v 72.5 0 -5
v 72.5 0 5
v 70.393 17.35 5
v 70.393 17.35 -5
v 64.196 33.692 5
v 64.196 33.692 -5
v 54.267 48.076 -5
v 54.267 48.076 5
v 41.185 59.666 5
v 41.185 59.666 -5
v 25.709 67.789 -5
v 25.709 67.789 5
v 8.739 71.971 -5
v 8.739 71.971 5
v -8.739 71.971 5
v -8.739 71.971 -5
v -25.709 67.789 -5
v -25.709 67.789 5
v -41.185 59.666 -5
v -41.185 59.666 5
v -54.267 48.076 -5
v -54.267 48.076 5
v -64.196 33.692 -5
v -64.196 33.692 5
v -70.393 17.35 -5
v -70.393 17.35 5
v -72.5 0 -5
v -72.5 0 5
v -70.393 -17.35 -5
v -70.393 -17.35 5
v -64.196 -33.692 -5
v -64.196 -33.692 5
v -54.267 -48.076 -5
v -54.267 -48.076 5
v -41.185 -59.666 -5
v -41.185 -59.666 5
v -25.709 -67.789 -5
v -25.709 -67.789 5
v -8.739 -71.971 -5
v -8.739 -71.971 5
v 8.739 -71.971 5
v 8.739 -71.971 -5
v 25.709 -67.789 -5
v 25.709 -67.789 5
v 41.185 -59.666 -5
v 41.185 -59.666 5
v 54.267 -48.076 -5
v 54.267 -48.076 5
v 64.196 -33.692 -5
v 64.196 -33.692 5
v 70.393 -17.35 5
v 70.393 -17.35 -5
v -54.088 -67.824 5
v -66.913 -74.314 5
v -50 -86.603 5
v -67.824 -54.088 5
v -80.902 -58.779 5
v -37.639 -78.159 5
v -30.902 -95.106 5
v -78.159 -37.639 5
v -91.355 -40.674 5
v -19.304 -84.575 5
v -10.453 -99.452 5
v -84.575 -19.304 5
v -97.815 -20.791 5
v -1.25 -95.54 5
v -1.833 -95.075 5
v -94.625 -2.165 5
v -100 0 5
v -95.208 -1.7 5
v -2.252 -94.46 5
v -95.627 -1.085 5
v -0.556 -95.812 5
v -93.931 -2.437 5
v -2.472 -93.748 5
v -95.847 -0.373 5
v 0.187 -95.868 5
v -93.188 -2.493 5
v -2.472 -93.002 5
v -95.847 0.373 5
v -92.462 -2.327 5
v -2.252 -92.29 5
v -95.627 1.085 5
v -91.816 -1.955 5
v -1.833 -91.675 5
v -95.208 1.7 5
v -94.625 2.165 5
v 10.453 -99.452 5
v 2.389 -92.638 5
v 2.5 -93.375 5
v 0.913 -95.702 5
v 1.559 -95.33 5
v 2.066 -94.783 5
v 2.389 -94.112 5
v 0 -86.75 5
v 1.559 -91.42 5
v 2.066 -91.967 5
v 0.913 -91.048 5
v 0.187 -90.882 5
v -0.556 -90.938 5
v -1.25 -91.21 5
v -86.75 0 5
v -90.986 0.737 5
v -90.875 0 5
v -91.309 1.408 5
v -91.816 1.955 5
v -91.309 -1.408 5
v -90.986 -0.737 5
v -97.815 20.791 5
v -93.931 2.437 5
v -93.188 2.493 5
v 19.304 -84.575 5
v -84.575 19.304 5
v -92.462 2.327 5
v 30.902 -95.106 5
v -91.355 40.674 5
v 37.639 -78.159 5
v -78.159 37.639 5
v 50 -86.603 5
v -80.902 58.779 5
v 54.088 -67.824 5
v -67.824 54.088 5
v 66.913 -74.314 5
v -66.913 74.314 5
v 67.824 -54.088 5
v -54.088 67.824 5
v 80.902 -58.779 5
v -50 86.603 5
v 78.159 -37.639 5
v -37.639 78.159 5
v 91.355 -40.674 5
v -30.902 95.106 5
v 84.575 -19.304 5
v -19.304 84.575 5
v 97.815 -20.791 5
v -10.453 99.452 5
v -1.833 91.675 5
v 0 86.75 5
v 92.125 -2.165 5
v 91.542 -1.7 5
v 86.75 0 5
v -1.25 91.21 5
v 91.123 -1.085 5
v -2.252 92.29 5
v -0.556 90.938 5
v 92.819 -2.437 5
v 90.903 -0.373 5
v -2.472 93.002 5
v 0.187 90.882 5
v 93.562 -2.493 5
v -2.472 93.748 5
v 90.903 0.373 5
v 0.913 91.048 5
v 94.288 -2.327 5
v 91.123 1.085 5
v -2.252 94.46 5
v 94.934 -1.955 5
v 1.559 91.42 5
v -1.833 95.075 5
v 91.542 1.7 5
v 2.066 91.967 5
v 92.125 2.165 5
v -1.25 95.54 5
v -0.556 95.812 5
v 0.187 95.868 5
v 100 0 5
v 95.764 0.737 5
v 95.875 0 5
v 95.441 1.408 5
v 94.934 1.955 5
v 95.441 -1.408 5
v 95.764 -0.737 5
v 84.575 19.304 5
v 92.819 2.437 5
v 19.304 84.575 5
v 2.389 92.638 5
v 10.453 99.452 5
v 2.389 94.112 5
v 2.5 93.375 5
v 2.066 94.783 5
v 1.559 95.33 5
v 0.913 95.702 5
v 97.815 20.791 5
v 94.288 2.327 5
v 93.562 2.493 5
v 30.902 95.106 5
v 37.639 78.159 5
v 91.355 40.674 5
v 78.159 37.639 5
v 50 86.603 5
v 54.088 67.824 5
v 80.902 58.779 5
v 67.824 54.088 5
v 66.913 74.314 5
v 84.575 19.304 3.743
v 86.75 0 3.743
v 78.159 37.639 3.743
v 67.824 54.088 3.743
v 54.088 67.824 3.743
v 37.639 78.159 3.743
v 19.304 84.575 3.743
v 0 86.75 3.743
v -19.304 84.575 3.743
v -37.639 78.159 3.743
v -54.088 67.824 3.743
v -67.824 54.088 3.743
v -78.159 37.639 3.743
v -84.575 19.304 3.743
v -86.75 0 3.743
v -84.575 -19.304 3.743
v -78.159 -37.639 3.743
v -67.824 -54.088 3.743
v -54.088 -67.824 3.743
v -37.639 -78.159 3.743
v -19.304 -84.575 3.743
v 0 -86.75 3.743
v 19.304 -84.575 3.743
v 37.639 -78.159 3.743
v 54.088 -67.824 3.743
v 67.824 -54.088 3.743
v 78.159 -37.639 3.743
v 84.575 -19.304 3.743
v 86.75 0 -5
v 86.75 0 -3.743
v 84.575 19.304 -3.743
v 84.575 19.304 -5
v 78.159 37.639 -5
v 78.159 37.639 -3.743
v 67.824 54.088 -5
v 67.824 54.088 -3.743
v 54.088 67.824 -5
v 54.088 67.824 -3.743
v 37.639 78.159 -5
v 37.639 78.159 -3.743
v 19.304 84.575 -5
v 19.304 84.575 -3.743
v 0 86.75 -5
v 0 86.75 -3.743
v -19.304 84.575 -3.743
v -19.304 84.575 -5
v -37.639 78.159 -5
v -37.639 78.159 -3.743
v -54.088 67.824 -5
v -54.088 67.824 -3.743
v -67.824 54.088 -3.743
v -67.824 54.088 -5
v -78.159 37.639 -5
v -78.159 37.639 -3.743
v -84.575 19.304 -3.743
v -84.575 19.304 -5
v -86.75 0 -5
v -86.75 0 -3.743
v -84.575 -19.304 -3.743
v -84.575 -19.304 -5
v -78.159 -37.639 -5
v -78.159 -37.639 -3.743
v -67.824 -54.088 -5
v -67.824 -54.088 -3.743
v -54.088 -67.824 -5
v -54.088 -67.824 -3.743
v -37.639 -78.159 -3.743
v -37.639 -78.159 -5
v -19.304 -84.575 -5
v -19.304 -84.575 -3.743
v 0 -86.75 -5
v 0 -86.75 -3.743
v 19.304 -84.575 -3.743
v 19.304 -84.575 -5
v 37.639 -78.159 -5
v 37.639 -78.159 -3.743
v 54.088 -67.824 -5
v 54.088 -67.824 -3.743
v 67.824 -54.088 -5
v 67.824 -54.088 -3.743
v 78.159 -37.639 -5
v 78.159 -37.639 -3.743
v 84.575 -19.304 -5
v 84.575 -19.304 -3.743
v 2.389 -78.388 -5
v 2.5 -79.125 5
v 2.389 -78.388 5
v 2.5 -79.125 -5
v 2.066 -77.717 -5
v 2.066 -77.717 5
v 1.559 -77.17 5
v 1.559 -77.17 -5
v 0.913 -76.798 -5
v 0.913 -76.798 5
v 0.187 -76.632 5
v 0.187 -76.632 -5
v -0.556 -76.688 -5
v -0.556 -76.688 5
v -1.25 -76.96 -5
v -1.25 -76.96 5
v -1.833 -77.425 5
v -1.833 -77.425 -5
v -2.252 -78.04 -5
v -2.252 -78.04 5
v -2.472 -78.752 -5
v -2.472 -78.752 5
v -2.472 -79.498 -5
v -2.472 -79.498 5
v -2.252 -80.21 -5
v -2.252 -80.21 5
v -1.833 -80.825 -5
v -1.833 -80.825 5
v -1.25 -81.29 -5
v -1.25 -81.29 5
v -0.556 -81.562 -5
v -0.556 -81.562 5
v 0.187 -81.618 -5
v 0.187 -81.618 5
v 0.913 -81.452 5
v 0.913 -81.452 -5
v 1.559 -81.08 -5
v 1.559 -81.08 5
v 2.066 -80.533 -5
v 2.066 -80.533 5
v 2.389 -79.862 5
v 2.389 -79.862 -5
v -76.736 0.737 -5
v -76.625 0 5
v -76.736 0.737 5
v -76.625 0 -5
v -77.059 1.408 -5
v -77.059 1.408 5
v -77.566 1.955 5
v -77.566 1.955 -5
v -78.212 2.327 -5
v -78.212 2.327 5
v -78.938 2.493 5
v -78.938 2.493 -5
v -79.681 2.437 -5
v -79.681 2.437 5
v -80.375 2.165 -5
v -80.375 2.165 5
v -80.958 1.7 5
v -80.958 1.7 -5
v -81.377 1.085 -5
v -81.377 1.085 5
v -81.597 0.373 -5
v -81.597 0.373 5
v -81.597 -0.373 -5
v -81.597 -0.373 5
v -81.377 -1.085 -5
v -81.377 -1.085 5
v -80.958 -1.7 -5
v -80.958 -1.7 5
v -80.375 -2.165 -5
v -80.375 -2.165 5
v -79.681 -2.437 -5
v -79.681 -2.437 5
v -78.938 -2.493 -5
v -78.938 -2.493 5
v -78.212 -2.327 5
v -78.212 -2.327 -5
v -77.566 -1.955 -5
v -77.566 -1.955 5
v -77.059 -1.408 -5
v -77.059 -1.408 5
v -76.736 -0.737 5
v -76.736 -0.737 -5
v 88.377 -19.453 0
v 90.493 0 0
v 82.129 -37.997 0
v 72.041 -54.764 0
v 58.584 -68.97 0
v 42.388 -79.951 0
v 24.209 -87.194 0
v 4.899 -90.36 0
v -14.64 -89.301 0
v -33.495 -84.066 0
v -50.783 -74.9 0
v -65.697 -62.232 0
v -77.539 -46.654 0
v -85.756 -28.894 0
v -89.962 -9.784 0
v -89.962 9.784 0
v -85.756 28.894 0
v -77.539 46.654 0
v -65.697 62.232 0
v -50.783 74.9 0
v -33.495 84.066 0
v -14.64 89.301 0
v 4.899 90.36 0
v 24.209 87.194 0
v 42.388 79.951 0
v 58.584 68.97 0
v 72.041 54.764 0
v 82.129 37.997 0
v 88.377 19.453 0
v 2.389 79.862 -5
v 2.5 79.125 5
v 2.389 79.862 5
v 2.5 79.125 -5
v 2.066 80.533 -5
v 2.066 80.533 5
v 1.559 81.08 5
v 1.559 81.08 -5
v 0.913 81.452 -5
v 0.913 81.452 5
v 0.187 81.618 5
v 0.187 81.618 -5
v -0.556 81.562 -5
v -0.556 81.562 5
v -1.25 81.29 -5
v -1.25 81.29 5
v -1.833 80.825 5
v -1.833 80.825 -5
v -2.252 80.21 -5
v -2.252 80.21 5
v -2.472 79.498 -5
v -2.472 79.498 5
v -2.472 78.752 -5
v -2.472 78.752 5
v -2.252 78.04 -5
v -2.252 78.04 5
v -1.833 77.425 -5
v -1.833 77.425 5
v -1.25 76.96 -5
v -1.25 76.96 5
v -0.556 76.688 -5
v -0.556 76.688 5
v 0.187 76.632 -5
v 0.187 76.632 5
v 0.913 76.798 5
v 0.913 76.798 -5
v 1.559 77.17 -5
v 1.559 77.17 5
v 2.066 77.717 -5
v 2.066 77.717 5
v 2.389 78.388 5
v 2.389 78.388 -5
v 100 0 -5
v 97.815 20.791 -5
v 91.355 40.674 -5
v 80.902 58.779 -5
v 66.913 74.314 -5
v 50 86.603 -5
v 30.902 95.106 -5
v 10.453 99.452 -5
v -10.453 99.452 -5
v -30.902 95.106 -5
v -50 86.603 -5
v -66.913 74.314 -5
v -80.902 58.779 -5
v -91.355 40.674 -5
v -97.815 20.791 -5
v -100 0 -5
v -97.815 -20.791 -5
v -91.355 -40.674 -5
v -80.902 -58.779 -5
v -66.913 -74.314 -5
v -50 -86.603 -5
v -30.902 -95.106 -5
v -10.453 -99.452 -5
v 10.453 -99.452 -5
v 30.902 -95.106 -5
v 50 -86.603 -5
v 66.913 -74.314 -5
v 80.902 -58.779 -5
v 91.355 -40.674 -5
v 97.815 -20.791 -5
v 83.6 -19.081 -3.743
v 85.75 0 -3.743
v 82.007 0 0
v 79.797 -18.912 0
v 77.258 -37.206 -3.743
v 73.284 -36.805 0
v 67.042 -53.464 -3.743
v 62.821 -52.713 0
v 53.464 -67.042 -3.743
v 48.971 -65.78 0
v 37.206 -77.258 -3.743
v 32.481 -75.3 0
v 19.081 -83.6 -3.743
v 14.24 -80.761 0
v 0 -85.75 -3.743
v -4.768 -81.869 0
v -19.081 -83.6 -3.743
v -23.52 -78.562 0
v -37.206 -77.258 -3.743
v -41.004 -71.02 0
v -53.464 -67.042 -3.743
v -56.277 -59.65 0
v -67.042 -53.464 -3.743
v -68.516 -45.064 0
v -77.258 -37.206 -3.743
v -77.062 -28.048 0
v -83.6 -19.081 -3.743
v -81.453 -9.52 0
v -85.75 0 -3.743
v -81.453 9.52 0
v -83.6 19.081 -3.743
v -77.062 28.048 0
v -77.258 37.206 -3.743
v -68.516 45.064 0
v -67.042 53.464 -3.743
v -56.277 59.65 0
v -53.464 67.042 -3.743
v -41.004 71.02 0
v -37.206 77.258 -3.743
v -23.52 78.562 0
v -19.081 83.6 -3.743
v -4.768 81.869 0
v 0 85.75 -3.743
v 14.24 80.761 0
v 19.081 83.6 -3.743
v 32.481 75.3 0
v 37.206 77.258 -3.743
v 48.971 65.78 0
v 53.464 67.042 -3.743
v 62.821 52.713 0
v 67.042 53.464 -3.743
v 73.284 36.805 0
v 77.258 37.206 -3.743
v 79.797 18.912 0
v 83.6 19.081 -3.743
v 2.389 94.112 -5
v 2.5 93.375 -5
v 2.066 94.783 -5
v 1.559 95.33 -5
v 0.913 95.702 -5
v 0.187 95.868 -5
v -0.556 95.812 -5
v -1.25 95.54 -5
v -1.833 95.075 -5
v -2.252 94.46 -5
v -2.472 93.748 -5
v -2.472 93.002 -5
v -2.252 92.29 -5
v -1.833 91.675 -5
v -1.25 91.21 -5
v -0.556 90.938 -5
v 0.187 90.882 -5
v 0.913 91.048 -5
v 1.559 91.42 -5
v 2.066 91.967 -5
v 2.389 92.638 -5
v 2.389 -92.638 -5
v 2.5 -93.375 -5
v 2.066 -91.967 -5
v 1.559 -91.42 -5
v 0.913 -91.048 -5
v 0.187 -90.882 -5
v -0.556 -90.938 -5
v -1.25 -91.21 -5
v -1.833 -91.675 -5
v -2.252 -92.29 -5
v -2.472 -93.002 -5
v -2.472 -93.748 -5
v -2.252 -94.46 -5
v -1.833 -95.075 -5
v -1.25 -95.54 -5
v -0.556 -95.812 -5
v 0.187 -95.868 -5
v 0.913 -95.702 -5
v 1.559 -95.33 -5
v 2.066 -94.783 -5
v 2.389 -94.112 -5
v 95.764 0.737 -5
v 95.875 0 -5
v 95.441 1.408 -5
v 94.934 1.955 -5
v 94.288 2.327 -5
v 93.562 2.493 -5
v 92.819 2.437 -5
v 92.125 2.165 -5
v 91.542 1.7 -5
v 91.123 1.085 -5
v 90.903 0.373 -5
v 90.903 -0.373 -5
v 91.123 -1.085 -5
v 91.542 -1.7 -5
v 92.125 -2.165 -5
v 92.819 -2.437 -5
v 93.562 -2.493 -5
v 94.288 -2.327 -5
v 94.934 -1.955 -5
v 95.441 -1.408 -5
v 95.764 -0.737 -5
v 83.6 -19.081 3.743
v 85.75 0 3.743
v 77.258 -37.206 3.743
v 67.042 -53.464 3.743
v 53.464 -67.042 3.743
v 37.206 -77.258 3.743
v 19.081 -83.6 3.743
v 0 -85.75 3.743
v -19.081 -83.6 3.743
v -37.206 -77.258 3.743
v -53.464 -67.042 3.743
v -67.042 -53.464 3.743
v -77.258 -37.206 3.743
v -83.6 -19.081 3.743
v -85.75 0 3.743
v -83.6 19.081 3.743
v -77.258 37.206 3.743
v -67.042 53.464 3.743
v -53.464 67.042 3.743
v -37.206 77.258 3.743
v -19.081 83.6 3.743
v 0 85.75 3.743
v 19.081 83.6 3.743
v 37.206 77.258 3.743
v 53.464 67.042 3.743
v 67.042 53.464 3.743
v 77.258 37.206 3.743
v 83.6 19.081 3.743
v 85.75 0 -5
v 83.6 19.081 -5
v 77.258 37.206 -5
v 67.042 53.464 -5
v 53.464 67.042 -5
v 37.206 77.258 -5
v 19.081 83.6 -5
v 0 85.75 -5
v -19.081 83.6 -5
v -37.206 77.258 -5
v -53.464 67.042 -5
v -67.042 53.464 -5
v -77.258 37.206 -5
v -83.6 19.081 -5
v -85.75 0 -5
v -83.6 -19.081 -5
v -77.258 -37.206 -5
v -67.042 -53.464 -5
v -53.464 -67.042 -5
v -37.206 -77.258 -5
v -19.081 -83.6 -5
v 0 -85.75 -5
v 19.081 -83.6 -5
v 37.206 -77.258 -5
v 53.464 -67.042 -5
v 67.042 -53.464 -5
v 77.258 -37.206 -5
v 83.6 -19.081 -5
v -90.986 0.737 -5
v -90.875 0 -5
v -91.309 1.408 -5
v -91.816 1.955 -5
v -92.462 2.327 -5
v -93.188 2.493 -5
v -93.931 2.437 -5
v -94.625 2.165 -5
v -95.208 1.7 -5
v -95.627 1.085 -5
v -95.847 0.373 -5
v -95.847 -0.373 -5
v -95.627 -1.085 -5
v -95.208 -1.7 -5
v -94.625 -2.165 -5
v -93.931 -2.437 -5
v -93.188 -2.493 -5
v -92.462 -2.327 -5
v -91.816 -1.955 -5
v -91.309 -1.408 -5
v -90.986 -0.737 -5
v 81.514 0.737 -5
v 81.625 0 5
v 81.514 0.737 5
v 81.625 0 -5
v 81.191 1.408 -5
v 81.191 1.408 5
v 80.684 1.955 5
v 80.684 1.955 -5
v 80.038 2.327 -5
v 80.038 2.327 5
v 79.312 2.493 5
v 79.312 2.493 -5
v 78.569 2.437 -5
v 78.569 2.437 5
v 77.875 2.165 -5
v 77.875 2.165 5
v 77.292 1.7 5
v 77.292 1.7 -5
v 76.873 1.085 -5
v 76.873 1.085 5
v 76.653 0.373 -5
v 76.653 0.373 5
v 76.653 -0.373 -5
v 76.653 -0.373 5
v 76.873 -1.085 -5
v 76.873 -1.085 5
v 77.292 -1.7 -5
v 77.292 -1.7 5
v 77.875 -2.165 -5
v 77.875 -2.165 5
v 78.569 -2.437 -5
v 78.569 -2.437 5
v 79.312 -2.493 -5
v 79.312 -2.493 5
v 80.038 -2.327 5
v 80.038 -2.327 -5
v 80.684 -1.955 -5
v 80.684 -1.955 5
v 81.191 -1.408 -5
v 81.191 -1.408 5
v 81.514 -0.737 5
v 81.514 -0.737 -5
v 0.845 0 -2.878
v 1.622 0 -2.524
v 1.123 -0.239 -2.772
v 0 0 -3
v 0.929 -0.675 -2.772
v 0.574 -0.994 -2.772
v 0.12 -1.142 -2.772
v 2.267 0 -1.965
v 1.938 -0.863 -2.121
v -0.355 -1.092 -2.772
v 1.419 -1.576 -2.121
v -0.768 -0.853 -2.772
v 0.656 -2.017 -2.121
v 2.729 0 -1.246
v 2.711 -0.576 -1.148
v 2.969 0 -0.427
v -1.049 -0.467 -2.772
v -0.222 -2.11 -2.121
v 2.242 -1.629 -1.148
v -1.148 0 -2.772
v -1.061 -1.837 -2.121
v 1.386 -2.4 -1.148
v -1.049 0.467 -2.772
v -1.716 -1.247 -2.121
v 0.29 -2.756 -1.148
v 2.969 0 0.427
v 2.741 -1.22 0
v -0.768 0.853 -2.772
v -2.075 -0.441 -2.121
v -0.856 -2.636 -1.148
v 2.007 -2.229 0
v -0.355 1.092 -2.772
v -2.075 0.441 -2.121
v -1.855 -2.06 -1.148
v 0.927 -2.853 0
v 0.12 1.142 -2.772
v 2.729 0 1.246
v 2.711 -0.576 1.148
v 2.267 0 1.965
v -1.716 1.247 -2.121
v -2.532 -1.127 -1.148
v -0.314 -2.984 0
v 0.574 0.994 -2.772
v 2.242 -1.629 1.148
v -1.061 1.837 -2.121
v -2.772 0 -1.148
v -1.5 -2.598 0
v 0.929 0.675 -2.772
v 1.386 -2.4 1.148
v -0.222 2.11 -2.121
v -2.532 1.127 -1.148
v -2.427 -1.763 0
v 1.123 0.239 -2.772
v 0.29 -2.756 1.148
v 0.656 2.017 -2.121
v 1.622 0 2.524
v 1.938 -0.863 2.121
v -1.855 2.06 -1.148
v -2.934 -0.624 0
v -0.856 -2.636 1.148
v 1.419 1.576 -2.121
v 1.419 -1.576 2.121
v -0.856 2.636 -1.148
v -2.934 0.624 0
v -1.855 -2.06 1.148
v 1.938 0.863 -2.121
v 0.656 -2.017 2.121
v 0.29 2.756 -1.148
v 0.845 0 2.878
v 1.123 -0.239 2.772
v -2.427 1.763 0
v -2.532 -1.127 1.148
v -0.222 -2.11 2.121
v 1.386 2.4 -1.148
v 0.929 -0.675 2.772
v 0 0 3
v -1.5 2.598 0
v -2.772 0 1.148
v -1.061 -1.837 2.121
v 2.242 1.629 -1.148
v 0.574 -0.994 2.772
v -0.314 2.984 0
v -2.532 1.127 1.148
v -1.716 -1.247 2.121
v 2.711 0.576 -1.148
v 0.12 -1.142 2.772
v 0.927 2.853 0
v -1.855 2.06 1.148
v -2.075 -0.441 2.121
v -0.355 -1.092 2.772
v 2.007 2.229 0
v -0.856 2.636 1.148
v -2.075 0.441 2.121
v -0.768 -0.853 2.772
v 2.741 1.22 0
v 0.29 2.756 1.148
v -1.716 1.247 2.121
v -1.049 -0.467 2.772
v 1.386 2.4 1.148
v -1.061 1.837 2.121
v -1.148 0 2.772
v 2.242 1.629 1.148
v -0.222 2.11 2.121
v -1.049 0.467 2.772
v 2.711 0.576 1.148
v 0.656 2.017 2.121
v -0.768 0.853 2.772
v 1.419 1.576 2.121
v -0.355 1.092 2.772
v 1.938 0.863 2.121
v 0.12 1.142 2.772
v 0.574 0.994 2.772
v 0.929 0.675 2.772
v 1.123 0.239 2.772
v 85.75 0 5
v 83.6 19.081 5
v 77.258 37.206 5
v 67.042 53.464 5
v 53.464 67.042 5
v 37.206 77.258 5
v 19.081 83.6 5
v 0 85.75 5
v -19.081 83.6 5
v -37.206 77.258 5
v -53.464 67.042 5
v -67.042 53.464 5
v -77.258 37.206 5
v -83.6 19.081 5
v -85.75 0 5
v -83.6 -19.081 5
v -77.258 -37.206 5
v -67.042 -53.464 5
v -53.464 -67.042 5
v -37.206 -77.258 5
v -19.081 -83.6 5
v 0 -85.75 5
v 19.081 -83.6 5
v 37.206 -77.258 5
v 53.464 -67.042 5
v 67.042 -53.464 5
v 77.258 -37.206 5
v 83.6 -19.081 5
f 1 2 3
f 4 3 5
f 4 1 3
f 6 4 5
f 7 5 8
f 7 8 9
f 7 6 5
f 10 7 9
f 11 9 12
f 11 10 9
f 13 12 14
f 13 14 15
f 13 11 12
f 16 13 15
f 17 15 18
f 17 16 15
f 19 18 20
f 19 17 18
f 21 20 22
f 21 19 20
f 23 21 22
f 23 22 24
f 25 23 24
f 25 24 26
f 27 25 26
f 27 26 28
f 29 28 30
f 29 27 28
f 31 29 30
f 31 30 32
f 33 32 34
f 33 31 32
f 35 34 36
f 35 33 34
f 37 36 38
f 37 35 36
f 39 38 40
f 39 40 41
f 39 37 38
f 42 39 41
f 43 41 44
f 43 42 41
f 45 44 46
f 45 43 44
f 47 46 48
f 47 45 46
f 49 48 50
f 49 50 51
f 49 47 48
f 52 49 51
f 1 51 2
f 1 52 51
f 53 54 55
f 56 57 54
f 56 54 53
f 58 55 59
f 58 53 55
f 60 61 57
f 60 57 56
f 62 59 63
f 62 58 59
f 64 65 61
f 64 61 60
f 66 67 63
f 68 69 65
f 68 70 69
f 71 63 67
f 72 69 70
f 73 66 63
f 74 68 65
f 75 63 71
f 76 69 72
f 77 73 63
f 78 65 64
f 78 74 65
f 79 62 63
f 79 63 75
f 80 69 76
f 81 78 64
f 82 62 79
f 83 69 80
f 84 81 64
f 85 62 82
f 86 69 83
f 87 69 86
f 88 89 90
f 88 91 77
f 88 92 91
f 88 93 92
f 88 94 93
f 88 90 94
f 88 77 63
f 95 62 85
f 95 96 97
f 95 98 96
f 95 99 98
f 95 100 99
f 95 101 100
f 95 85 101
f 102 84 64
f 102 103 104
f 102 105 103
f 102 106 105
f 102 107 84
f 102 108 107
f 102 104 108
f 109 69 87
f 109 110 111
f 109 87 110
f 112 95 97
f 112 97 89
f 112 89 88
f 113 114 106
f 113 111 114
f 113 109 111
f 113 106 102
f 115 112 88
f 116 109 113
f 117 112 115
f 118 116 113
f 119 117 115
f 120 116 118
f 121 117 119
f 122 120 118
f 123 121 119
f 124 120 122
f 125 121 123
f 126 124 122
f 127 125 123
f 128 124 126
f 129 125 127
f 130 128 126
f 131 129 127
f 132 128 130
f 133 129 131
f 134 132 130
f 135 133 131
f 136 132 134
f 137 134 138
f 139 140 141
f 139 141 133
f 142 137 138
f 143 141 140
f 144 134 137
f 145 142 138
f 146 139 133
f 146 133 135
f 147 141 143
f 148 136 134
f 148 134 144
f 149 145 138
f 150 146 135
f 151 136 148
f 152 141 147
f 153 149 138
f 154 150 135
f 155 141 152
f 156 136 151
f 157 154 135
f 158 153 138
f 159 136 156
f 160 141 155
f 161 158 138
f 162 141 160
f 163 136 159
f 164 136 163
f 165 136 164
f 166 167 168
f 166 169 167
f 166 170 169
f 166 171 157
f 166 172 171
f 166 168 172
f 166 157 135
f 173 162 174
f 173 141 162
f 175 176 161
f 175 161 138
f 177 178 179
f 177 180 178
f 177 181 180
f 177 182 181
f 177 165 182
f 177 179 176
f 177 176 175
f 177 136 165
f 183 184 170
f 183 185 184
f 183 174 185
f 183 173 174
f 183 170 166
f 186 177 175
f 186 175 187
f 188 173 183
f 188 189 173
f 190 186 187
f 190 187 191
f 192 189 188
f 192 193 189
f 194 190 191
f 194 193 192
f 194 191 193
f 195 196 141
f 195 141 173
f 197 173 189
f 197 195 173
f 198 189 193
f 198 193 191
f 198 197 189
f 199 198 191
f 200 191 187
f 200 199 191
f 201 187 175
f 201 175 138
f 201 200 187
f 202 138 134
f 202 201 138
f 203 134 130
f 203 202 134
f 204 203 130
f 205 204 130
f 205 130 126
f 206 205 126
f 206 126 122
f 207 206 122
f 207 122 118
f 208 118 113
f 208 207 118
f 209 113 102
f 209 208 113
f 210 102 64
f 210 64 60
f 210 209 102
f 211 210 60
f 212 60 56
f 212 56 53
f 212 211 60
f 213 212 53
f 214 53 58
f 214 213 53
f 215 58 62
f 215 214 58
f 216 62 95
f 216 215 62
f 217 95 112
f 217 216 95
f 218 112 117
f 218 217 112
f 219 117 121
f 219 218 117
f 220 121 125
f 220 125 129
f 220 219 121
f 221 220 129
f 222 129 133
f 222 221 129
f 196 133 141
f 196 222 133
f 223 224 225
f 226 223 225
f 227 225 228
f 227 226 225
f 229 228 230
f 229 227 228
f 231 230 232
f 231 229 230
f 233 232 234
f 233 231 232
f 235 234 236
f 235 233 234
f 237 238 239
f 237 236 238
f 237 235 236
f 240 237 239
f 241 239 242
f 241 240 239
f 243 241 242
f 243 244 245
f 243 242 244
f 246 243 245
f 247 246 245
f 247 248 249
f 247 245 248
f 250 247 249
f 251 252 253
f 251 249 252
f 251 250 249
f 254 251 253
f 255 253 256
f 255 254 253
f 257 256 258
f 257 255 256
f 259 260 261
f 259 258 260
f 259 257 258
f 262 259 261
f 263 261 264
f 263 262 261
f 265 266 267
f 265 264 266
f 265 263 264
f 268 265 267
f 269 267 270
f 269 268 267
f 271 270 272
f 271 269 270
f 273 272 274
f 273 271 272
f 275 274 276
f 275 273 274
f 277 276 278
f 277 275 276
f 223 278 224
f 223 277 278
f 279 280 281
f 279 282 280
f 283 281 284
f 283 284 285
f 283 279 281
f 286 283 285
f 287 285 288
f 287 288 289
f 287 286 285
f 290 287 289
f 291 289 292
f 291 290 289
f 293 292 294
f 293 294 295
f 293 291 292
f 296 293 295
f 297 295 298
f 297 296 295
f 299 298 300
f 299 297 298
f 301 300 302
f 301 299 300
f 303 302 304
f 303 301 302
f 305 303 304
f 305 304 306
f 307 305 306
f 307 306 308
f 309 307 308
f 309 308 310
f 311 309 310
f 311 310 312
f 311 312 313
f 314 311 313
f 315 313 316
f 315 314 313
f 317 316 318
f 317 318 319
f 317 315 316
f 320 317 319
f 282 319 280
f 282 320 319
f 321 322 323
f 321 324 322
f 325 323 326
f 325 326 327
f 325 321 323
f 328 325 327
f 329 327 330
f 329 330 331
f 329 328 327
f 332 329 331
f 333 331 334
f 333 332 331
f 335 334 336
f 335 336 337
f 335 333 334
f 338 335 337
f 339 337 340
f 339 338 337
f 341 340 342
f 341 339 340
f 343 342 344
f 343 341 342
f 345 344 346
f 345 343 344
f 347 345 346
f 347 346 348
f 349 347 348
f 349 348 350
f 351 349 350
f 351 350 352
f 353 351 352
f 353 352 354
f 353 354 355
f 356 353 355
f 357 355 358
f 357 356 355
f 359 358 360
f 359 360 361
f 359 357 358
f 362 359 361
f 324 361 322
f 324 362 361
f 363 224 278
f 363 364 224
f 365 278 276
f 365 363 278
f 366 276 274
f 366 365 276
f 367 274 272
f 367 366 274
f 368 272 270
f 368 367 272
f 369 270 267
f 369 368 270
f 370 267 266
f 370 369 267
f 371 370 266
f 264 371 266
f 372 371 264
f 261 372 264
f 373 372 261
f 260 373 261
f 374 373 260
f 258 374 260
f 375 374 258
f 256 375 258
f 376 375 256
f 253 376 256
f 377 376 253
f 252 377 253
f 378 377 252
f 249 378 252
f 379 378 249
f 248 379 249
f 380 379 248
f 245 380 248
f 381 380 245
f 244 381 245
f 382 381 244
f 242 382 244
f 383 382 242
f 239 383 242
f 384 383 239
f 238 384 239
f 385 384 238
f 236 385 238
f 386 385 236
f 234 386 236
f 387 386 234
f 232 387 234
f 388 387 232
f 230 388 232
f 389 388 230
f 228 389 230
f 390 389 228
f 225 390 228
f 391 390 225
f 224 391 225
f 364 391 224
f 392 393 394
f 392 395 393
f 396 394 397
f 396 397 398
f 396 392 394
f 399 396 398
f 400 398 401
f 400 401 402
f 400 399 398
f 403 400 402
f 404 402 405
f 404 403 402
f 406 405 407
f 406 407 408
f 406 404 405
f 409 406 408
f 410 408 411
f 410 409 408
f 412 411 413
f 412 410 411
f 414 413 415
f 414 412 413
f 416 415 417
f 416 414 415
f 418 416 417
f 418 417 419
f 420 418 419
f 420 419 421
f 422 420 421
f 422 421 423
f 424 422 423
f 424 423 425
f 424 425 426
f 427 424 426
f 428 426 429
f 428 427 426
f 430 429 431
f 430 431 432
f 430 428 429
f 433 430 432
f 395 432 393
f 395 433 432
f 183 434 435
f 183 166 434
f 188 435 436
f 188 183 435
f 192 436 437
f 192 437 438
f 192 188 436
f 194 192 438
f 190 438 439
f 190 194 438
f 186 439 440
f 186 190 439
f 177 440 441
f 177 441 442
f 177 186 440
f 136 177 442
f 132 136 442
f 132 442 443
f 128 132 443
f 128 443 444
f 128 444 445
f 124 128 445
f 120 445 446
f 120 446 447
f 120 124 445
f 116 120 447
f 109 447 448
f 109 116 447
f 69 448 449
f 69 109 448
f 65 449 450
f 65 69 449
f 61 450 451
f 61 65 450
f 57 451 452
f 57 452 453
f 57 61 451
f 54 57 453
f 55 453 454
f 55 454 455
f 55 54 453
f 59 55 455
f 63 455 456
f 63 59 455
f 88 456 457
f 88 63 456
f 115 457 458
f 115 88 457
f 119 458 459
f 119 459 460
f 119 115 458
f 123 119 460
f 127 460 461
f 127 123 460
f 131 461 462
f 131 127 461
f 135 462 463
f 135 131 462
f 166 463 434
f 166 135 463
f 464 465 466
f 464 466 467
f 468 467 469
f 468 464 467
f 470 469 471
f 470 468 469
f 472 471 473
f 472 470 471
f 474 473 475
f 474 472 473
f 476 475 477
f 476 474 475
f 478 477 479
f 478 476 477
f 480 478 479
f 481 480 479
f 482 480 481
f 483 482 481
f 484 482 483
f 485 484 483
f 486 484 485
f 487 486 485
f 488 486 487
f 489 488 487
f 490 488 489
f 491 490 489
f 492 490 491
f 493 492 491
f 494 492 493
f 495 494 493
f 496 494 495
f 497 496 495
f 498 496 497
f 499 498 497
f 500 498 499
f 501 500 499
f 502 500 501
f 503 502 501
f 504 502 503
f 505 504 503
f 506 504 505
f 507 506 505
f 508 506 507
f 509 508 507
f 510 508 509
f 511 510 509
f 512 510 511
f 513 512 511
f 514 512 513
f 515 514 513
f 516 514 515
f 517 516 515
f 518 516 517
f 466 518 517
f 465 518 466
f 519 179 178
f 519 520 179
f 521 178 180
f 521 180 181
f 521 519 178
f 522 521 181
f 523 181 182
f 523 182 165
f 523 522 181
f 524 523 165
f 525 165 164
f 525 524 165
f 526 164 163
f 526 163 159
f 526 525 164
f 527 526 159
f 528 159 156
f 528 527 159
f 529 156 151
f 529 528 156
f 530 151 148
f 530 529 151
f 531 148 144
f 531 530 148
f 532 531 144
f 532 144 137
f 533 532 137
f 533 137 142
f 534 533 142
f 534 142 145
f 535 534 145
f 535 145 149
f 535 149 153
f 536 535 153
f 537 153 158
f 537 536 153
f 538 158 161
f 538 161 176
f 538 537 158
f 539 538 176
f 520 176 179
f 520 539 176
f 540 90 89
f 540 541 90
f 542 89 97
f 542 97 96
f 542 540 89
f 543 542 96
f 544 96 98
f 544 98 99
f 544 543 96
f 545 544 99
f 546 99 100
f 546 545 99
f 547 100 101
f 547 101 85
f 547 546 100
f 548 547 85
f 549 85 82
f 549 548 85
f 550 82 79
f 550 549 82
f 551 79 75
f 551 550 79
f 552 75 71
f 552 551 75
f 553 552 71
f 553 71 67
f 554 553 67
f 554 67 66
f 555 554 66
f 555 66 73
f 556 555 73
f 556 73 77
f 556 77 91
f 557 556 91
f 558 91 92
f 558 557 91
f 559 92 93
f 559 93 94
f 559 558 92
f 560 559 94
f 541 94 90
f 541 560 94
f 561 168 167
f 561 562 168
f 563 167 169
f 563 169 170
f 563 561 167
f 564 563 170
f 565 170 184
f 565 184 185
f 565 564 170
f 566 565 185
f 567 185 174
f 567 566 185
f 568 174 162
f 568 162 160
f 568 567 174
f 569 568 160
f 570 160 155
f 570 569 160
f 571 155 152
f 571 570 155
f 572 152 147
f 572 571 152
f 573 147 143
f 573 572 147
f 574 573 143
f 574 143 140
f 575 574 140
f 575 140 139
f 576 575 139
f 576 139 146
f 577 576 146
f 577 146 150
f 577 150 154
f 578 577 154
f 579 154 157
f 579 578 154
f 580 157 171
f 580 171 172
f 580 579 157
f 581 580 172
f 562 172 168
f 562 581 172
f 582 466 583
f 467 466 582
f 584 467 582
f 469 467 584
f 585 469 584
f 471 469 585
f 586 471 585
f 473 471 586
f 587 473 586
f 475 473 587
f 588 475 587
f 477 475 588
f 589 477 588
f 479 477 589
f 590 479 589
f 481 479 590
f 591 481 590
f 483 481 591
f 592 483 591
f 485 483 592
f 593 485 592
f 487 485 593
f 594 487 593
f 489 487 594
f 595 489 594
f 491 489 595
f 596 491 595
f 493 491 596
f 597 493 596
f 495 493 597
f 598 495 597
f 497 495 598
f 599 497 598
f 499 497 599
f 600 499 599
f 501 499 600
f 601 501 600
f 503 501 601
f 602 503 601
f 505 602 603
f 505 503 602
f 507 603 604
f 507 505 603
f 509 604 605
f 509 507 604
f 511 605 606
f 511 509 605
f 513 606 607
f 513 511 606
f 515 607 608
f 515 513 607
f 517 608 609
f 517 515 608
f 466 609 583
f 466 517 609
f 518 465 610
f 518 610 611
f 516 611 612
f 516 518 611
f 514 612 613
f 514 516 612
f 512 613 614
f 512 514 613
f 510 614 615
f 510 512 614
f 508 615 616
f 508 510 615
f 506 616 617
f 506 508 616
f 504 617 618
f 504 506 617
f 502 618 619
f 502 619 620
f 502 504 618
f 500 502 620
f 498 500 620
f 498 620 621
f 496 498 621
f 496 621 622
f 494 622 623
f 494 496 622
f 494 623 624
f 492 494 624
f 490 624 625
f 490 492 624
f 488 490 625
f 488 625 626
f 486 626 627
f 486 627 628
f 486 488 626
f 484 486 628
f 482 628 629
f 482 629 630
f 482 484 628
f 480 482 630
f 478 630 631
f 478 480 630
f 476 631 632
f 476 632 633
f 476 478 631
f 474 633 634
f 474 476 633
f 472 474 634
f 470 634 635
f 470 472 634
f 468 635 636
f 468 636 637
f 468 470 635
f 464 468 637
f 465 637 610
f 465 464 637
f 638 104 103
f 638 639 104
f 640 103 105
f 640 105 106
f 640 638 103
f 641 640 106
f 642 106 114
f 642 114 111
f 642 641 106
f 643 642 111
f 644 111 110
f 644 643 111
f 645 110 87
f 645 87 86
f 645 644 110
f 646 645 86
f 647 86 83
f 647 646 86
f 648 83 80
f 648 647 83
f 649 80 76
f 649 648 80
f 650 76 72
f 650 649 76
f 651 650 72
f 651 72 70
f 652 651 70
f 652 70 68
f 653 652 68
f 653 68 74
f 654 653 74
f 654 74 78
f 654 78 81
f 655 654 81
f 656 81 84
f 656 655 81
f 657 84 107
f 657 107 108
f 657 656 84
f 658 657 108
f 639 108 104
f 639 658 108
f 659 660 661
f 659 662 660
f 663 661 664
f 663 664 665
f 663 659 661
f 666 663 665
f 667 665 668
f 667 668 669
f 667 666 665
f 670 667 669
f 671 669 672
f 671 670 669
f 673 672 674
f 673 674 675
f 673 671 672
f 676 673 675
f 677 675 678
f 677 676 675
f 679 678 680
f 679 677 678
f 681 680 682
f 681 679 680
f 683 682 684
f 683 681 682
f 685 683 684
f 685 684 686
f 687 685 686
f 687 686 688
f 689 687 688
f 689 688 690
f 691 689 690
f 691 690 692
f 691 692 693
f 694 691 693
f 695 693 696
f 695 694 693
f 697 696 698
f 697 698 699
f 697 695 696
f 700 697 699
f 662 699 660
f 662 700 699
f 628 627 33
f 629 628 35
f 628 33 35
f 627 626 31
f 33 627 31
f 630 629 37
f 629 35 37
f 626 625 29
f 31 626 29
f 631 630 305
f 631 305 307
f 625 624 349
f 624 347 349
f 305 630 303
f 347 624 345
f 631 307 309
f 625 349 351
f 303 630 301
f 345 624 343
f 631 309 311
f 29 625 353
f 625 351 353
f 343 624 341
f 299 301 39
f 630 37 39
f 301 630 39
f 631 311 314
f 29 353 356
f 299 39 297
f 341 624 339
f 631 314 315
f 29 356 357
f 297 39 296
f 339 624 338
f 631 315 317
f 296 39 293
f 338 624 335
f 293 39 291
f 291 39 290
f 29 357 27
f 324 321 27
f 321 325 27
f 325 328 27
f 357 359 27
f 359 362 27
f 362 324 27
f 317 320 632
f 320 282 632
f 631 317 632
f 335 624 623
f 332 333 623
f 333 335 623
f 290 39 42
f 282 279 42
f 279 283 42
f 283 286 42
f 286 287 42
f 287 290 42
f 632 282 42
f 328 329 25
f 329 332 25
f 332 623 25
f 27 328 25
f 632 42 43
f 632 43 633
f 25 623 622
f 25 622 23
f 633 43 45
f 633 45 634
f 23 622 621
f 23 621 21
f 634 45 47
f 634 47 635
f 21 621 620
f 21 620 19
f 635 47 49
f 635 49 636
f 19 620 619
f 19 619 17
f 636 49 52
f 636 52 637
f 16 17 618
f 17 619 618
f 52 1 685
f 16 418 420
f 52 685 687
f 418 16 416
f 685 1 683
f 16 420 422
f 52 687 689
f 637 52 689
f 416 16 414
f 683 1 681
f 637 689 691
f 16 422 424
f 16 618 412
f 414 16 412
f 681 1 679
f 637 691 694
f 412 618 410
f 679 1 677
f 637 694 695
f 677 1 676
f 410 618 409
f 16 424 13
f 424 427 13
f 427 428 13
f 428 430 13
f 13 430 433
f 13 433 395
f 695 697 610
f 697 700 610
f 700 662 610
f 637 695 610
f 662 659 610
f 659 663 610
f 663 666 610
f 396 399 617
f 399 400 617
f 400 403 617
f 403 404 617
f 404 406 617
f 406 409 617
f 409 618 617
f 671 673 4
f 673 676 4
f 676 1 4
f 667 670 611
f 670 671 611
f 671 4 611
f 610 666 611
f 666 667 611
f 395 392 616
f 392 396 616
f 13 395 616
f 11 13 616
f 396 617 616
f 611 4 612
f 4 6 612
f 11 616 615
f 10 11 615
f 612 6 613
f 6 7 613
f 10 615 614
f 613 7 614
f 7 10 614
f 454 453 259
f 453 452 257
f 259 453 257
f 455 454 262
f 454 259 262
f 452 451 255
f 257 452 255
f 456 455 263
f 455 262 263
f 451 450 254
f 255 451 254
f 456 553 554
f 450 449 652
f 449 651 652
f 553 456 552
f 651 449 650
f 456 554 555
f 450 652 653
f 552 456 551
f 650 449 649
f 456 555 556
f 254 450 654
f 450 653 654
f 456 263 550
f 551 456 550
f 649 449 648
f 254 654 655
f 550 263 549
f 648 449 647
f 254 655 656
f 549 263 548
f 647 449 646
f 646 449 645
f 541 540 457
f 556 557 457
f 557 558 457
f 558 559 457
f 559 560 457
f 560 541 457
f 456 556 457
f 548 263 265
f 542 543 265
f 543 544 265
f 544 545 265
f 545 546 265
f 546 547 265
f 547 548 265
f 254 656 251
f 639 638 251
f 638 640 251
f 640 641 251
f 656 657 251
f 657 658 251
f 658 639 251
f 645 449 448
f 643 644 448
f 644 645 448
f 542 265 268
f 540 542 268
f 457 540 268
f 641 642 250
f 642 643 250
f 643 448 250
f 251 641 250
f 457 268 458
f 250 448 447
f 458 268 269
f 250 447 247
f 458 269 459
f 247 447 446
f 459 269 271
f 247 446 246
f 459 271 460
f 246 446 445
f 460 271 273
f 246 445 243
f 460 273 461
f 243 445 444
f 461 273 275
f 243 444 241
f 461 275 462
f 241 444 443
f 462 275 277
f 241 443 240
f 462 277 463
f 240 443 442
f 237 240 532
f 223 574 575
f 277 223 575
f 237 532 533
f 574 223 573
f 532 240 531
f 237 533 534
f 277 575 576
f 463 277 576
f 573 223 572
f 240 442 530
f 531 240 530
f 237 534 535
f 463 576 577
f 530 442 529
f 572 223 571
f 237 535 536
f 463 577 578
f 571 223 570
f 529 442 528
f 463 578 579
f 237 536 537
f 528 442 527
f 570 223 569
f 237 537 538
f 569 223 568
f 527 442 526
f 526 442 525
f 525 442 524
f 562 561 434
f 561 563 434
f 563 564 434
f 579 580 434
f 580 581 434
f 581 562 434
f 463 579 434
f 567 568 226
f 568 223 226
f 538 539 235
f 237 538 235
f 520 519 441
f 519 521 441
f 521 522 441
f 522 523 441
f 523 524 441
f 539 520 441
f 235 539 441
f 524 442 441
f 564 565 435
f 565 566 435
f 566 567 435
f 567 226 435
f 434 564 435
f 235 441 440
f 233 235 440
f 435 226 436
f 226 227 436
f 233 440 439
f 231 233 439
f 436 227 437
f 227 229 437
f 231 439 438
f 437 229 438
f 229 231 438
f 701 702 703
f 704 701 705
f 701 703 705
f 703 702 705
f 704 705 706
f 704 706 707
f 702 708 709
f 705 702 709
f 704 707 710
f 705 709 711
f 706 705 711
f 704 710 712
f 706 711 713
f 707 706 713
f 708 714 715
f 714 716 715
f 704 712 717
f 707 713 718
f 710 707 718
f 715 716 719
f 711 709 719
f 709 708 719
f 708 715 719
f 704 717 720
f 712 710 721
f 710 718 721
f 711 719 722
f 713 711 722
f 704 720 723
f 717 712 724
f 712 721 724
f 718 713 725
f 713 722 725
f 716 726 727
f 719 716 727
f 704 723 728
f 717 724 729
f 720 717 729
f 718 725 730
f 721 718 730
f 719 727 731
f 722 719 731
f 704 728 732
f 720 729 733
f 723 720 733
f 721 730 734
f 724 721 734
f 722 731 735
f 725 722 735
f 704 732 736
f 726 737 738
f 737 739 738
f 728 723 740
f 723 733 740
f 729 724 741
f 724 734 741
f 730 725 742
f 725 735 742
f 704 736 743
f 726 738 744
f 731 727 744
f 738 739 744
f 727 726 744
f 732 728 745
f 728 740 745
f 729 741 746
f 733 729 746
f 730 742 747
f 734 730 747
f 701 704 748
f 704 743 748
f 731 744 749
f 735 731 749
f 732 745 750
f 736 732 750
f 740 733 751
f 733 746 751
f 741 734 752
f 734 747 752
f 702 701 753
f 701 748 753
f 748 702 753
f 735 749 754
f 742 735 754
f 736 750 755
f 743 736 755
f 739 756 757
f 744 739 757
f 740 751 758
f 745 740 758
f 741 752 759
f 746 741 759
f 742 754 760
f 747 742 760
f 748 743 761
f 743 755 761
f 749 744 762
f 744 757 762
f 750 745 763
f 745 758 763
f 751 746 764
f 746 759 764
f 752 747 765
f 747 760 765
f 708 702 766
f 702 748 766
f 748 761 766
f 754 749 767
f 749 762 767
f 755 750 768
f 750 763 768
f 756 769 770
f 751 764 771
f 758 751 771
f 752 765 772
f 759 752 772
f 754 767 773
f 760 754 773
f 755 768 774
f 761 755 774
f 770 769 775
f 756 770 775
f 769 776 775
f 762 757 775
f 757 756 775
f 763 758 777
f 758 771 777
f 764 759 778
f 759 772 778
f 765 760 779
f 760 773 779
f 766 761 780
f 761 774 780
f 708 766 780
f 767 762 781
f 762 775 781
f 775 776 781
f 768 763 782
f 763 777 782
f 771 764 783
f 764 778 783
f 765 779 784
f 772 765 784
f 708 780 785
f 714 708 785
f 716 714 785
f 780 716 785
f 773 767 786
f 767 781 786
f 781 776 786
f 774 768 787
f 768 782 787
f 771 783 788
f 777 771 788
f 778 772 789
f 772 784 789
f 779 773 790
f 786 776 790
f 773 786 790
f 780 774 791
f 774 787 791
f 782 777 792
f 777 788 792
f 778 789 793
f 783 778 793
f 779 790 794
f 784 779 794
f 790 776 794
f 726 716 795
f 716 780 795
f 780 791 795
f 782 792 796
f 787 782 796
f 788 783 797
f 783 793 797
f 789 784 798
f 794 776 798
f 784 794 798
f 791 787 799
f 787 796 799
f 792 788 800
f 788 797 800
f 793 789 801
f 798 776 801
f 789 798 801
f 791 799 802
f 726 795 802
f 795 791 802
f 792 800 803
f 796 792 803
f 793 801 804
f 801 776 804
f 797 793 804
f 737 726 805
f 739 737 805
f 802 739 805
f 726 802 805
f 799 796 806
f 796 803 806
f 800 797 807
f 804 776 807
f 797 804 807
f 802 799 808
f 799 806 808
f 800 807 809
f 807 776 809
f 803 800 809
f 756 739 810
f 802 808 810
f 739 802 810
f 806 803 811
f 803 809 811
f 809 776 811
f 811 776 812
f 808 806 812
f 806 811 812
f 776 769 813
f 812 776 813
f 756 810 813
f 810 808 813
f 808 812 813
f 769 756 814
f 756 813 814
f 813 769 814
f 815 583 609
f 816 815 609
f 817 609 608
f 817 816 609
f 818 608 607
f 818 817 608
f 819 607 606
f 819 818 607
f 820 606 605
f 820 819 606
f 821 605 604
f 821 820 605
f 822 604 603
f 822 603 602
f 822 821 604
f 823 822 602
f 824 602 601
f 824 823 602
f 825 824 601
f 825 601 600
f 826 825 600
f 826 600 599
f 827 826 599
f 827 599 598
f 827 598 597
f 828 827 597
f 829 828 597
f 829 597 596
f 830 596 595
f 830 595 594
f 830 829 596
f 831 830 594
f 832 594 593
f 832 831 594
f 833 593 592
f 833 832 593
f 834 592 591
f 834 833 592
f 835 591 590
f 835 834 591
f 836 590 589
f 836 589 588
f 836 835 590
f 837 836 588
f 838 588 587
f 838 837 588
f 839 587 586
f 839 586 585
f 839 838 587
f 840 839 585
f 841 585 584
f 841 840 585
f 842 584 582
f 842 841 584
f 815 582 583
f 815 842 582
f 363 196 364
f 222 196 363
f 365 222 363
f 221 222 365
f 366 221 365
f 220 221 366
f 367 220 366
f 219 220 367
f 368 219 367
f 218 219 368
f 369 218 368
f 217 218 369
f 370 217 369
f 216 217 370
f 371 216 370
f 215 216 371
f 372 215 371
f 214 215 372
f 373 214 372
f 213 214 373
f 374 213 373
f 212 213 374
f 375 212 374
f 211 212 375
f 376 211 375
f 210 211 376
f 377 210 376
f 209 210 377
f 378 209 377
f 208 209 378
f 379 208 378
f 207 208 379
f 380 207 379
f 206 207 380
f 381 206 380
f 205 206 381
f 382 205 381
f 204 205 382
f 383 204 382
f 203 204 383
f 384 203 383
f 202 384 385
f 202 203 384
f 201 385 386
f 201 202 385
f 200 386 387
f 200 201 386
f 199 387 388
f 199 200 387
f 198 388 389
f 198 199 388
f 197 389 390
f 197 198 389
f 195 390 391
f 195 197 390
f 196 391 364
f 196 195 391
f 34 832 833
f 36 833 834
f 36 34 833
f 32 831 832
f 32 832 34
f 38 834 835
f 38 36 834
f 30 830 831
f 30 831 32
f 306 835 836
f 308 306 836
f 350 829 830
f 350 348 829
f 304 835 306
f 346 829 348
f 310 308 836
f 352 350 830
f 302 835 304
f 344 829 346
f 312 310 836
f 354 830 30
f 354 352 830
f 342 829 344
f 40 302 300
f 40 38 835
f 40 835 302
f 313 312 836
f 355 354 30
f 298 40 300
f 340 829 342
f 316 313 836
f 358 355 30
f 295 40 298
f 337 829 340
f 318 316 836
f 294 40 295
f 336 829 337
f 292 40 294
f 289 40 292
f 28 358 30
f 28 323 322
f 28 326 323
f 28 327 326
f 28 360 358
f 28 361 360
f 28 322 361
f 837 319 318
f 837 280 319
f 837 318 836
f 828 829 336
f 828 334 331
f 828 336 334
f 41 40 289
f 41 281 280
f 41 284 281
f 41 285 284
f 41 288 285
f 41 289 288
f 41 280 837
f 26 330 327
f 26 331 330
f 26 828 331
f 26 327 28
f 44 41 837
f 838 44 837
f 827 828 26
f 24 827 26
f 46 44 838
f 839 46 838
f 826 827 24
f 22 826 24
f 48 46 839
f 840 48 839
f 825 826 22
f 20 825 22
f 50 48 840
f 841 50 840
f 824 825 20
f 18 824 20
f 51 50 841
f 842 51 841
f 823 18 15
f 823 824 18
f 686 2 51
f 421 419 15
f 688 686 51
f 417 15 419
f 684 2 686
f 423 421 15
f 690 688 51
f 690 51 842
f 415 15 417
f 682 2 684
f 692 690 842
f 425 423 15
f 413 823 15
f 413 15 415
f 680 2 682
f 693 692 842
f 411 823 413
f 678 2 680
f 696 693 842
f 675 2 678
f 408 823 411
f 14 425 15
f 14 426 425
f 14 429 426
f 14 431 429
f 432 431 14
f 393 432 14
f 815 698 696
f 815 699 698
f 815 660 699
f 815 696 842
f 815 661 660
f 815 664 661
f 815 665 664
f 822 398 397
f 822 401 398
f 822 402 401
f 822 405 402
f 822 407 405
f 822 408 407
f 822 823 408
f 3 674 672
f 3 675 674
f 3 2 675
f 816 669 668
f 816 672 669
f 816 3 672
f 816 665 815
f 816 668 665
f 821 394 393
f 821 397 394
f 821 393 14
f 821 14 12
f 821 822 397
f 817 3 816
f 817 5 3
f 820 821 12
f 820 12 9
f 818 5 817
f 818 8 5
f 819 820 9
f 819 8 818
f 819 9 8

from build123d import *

# Parameters (mm, degrees)
F1_R     = 100
F1_R_2   = 2.5
F1_R_3   = 86.75
F2_DEPTH = 5
F3_R     = 85.75
F3_R_2   = 2.5
F3_R_3   = 72.5
F4_DEPTH = 5


with BuildPart() as f2:
    # F1 (on Top) → F2 (new body, symmetric)
    with BuildSketch(Plane.XY):
        Circle(F1_R)
        with Locations((0, -93.375)):
            Circle(F1_R_2, mode=Mode.SUBTRACT)
        with Locations((-93.375, 0)):
            Circle(F1_R_2, mode=Mode.SUBTRACT)
        Circle(F1_R_3, mode=Mode.SUBTRACT)
        with Locations((93.375, 0)):
            Circle(F1_R_2, mode=Mode.SUBTRACT)
        with Locations((0, 93.375)):
            Circle(F1_R_2, mode=Mode.SUBTRACT)
    extrude(amount=F2_DEPTH, both=True)


with BuildPart() as f4:
    # F3 (on Top) → F4 (new body, symmetric)
    with BuildSketch(Plane.XY):
        Circle(F3_R)
        with Locations((0, -79.125)):
            Circle(F3_R_2, mode=Mode.SUBTRACT)
        with Locations((-79.125, 0)):
            Circle(F3_R_2, mode=Mode.SUBTRACT)
        Circle(F3_R_3, mode=Mode.SUBTRACT)
        with Locations((79.125, 0)):
            Circle(F3_R_2, mode=Mode.SUBTRACT)
        with Locations((0, 79.125)):
            Circle(F3_R_2, mode=Mode.SUBTRACT)
    extrude(amount=F4_DEPTH, both=True)


with BuildPart() as f6:
    # F5 (on Front) → F6 (revolve)
    with BuildSketch(Plane.XZ):
        Polygon((90.4926406871, 0), (86.25, 4.2426406871), (82.0073593129, 0), (86.25, -4.2426406871), align=None)
    revolve(axis=Axis((0, 0, 0), (0, 0, -1)))


with BuildPart() as f2_1:
    add(f2.part)

    # F7: cut F6
    add(f6.part, mode=Mode.SUBTRACT)


with BuildPart() as f4_1:
    add(f4.part)

    # F7: cut F6
    add(f6.part, mode=Mode.SUBTRACT)


with BuildPart() as f9:
    # F8 (on Front) → F9 (revolve)
    with BuildSketch(Plane.XZ):
        with BuildLine():
            Line((0, 3), (0, -3))
            ThreePointArc((0, -3), (3, 0), (0, 3))
        make_face()
    revolve(axis=Axis((0, 0, 0), (0, 0, -1)))


solid = Compound([f2_1.part, f4_1.part, f9.part])
